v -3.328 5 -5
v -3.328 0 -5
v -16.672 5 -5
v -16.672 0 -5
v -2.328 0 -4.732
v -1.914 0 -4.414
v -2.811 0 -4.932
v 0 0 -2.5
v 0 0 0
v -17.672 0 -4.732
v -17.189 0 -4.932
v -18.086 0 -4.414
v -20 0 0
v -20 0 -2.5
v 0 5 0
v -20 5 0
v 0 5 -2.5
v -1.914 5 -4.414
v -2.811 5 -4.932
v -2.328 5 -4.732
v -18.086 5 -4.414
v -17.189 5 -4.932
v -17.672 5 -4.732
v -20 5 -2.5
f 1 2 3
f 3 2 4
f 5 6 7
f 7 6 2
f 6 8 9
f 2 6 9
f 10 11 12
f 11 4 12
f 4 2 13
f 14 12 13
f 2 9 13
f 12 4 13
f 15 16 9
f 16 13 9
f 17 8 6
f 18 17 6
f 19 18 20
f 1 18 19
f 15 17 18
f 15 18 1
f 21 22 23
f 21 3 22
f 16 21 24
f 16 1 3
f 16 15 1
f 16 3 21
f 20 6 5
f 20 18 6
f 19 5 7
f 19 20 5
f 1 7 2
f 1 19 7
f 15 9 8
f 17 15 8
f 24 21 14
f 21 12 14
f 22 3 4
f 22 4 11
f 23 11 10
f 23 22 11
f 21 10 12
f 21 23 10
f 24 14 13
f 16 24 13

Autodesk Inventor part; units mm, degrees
ref_plane "YZ Plane" through (0, 0, 0) normal (1, 0, 0) x (0, 1, 0)
ref_plane "XZ Plane" through (0, 0, 0) normal (0, 1, 0) x (-1, 0, 0)
ref_plane "XY Plane" through (0, 0, 0) normal (0, 0, 1) x (1, 0, 0)
sketch "Sketch1" plane through (0, 0, 0) normal (0, 1, 0) x (-1, 0, 0)
  line L0 (0, 0) -> (0, -2.5)
  line L1 (0, -2.5) -> (2.5, -5)
  line L2 (2.5, -5) -> (17.5, -5)
  line L3 (17.5, -5) -> (20, -2.5)
  line L4 (20, -2.5) -> (20, 0)
  line L5 (20, 0) -> (0, 0)
  point P0 (20, -1.25)
  dimension "d0" = 45
  dimension "d1" = 45
  dimension "d2" = 5
  dimension "d3" = 20
  dimension "d4" = 2.5
extrude "Extrusion1" add sketch "Sketch1" along normal blind 5
fillet "Fillet1" radius 2 2 edges at (-2.5, 2.5, -5) (-17.5, 2.5, -5)
equation "\"d2\" = glide_plate_height"
equation "\"d3\" = glide_plate_length"
equation "\"d4\" = 0.5 * d2"
equation "\"d5\" = glide_plate_width"
equation "\"glide_plate_height\" = 5"
equation "\"glide_plate_length\" = 20"
equation "\"glide_plate_width\" = 5"
properties part number "steal_glide_plate"
